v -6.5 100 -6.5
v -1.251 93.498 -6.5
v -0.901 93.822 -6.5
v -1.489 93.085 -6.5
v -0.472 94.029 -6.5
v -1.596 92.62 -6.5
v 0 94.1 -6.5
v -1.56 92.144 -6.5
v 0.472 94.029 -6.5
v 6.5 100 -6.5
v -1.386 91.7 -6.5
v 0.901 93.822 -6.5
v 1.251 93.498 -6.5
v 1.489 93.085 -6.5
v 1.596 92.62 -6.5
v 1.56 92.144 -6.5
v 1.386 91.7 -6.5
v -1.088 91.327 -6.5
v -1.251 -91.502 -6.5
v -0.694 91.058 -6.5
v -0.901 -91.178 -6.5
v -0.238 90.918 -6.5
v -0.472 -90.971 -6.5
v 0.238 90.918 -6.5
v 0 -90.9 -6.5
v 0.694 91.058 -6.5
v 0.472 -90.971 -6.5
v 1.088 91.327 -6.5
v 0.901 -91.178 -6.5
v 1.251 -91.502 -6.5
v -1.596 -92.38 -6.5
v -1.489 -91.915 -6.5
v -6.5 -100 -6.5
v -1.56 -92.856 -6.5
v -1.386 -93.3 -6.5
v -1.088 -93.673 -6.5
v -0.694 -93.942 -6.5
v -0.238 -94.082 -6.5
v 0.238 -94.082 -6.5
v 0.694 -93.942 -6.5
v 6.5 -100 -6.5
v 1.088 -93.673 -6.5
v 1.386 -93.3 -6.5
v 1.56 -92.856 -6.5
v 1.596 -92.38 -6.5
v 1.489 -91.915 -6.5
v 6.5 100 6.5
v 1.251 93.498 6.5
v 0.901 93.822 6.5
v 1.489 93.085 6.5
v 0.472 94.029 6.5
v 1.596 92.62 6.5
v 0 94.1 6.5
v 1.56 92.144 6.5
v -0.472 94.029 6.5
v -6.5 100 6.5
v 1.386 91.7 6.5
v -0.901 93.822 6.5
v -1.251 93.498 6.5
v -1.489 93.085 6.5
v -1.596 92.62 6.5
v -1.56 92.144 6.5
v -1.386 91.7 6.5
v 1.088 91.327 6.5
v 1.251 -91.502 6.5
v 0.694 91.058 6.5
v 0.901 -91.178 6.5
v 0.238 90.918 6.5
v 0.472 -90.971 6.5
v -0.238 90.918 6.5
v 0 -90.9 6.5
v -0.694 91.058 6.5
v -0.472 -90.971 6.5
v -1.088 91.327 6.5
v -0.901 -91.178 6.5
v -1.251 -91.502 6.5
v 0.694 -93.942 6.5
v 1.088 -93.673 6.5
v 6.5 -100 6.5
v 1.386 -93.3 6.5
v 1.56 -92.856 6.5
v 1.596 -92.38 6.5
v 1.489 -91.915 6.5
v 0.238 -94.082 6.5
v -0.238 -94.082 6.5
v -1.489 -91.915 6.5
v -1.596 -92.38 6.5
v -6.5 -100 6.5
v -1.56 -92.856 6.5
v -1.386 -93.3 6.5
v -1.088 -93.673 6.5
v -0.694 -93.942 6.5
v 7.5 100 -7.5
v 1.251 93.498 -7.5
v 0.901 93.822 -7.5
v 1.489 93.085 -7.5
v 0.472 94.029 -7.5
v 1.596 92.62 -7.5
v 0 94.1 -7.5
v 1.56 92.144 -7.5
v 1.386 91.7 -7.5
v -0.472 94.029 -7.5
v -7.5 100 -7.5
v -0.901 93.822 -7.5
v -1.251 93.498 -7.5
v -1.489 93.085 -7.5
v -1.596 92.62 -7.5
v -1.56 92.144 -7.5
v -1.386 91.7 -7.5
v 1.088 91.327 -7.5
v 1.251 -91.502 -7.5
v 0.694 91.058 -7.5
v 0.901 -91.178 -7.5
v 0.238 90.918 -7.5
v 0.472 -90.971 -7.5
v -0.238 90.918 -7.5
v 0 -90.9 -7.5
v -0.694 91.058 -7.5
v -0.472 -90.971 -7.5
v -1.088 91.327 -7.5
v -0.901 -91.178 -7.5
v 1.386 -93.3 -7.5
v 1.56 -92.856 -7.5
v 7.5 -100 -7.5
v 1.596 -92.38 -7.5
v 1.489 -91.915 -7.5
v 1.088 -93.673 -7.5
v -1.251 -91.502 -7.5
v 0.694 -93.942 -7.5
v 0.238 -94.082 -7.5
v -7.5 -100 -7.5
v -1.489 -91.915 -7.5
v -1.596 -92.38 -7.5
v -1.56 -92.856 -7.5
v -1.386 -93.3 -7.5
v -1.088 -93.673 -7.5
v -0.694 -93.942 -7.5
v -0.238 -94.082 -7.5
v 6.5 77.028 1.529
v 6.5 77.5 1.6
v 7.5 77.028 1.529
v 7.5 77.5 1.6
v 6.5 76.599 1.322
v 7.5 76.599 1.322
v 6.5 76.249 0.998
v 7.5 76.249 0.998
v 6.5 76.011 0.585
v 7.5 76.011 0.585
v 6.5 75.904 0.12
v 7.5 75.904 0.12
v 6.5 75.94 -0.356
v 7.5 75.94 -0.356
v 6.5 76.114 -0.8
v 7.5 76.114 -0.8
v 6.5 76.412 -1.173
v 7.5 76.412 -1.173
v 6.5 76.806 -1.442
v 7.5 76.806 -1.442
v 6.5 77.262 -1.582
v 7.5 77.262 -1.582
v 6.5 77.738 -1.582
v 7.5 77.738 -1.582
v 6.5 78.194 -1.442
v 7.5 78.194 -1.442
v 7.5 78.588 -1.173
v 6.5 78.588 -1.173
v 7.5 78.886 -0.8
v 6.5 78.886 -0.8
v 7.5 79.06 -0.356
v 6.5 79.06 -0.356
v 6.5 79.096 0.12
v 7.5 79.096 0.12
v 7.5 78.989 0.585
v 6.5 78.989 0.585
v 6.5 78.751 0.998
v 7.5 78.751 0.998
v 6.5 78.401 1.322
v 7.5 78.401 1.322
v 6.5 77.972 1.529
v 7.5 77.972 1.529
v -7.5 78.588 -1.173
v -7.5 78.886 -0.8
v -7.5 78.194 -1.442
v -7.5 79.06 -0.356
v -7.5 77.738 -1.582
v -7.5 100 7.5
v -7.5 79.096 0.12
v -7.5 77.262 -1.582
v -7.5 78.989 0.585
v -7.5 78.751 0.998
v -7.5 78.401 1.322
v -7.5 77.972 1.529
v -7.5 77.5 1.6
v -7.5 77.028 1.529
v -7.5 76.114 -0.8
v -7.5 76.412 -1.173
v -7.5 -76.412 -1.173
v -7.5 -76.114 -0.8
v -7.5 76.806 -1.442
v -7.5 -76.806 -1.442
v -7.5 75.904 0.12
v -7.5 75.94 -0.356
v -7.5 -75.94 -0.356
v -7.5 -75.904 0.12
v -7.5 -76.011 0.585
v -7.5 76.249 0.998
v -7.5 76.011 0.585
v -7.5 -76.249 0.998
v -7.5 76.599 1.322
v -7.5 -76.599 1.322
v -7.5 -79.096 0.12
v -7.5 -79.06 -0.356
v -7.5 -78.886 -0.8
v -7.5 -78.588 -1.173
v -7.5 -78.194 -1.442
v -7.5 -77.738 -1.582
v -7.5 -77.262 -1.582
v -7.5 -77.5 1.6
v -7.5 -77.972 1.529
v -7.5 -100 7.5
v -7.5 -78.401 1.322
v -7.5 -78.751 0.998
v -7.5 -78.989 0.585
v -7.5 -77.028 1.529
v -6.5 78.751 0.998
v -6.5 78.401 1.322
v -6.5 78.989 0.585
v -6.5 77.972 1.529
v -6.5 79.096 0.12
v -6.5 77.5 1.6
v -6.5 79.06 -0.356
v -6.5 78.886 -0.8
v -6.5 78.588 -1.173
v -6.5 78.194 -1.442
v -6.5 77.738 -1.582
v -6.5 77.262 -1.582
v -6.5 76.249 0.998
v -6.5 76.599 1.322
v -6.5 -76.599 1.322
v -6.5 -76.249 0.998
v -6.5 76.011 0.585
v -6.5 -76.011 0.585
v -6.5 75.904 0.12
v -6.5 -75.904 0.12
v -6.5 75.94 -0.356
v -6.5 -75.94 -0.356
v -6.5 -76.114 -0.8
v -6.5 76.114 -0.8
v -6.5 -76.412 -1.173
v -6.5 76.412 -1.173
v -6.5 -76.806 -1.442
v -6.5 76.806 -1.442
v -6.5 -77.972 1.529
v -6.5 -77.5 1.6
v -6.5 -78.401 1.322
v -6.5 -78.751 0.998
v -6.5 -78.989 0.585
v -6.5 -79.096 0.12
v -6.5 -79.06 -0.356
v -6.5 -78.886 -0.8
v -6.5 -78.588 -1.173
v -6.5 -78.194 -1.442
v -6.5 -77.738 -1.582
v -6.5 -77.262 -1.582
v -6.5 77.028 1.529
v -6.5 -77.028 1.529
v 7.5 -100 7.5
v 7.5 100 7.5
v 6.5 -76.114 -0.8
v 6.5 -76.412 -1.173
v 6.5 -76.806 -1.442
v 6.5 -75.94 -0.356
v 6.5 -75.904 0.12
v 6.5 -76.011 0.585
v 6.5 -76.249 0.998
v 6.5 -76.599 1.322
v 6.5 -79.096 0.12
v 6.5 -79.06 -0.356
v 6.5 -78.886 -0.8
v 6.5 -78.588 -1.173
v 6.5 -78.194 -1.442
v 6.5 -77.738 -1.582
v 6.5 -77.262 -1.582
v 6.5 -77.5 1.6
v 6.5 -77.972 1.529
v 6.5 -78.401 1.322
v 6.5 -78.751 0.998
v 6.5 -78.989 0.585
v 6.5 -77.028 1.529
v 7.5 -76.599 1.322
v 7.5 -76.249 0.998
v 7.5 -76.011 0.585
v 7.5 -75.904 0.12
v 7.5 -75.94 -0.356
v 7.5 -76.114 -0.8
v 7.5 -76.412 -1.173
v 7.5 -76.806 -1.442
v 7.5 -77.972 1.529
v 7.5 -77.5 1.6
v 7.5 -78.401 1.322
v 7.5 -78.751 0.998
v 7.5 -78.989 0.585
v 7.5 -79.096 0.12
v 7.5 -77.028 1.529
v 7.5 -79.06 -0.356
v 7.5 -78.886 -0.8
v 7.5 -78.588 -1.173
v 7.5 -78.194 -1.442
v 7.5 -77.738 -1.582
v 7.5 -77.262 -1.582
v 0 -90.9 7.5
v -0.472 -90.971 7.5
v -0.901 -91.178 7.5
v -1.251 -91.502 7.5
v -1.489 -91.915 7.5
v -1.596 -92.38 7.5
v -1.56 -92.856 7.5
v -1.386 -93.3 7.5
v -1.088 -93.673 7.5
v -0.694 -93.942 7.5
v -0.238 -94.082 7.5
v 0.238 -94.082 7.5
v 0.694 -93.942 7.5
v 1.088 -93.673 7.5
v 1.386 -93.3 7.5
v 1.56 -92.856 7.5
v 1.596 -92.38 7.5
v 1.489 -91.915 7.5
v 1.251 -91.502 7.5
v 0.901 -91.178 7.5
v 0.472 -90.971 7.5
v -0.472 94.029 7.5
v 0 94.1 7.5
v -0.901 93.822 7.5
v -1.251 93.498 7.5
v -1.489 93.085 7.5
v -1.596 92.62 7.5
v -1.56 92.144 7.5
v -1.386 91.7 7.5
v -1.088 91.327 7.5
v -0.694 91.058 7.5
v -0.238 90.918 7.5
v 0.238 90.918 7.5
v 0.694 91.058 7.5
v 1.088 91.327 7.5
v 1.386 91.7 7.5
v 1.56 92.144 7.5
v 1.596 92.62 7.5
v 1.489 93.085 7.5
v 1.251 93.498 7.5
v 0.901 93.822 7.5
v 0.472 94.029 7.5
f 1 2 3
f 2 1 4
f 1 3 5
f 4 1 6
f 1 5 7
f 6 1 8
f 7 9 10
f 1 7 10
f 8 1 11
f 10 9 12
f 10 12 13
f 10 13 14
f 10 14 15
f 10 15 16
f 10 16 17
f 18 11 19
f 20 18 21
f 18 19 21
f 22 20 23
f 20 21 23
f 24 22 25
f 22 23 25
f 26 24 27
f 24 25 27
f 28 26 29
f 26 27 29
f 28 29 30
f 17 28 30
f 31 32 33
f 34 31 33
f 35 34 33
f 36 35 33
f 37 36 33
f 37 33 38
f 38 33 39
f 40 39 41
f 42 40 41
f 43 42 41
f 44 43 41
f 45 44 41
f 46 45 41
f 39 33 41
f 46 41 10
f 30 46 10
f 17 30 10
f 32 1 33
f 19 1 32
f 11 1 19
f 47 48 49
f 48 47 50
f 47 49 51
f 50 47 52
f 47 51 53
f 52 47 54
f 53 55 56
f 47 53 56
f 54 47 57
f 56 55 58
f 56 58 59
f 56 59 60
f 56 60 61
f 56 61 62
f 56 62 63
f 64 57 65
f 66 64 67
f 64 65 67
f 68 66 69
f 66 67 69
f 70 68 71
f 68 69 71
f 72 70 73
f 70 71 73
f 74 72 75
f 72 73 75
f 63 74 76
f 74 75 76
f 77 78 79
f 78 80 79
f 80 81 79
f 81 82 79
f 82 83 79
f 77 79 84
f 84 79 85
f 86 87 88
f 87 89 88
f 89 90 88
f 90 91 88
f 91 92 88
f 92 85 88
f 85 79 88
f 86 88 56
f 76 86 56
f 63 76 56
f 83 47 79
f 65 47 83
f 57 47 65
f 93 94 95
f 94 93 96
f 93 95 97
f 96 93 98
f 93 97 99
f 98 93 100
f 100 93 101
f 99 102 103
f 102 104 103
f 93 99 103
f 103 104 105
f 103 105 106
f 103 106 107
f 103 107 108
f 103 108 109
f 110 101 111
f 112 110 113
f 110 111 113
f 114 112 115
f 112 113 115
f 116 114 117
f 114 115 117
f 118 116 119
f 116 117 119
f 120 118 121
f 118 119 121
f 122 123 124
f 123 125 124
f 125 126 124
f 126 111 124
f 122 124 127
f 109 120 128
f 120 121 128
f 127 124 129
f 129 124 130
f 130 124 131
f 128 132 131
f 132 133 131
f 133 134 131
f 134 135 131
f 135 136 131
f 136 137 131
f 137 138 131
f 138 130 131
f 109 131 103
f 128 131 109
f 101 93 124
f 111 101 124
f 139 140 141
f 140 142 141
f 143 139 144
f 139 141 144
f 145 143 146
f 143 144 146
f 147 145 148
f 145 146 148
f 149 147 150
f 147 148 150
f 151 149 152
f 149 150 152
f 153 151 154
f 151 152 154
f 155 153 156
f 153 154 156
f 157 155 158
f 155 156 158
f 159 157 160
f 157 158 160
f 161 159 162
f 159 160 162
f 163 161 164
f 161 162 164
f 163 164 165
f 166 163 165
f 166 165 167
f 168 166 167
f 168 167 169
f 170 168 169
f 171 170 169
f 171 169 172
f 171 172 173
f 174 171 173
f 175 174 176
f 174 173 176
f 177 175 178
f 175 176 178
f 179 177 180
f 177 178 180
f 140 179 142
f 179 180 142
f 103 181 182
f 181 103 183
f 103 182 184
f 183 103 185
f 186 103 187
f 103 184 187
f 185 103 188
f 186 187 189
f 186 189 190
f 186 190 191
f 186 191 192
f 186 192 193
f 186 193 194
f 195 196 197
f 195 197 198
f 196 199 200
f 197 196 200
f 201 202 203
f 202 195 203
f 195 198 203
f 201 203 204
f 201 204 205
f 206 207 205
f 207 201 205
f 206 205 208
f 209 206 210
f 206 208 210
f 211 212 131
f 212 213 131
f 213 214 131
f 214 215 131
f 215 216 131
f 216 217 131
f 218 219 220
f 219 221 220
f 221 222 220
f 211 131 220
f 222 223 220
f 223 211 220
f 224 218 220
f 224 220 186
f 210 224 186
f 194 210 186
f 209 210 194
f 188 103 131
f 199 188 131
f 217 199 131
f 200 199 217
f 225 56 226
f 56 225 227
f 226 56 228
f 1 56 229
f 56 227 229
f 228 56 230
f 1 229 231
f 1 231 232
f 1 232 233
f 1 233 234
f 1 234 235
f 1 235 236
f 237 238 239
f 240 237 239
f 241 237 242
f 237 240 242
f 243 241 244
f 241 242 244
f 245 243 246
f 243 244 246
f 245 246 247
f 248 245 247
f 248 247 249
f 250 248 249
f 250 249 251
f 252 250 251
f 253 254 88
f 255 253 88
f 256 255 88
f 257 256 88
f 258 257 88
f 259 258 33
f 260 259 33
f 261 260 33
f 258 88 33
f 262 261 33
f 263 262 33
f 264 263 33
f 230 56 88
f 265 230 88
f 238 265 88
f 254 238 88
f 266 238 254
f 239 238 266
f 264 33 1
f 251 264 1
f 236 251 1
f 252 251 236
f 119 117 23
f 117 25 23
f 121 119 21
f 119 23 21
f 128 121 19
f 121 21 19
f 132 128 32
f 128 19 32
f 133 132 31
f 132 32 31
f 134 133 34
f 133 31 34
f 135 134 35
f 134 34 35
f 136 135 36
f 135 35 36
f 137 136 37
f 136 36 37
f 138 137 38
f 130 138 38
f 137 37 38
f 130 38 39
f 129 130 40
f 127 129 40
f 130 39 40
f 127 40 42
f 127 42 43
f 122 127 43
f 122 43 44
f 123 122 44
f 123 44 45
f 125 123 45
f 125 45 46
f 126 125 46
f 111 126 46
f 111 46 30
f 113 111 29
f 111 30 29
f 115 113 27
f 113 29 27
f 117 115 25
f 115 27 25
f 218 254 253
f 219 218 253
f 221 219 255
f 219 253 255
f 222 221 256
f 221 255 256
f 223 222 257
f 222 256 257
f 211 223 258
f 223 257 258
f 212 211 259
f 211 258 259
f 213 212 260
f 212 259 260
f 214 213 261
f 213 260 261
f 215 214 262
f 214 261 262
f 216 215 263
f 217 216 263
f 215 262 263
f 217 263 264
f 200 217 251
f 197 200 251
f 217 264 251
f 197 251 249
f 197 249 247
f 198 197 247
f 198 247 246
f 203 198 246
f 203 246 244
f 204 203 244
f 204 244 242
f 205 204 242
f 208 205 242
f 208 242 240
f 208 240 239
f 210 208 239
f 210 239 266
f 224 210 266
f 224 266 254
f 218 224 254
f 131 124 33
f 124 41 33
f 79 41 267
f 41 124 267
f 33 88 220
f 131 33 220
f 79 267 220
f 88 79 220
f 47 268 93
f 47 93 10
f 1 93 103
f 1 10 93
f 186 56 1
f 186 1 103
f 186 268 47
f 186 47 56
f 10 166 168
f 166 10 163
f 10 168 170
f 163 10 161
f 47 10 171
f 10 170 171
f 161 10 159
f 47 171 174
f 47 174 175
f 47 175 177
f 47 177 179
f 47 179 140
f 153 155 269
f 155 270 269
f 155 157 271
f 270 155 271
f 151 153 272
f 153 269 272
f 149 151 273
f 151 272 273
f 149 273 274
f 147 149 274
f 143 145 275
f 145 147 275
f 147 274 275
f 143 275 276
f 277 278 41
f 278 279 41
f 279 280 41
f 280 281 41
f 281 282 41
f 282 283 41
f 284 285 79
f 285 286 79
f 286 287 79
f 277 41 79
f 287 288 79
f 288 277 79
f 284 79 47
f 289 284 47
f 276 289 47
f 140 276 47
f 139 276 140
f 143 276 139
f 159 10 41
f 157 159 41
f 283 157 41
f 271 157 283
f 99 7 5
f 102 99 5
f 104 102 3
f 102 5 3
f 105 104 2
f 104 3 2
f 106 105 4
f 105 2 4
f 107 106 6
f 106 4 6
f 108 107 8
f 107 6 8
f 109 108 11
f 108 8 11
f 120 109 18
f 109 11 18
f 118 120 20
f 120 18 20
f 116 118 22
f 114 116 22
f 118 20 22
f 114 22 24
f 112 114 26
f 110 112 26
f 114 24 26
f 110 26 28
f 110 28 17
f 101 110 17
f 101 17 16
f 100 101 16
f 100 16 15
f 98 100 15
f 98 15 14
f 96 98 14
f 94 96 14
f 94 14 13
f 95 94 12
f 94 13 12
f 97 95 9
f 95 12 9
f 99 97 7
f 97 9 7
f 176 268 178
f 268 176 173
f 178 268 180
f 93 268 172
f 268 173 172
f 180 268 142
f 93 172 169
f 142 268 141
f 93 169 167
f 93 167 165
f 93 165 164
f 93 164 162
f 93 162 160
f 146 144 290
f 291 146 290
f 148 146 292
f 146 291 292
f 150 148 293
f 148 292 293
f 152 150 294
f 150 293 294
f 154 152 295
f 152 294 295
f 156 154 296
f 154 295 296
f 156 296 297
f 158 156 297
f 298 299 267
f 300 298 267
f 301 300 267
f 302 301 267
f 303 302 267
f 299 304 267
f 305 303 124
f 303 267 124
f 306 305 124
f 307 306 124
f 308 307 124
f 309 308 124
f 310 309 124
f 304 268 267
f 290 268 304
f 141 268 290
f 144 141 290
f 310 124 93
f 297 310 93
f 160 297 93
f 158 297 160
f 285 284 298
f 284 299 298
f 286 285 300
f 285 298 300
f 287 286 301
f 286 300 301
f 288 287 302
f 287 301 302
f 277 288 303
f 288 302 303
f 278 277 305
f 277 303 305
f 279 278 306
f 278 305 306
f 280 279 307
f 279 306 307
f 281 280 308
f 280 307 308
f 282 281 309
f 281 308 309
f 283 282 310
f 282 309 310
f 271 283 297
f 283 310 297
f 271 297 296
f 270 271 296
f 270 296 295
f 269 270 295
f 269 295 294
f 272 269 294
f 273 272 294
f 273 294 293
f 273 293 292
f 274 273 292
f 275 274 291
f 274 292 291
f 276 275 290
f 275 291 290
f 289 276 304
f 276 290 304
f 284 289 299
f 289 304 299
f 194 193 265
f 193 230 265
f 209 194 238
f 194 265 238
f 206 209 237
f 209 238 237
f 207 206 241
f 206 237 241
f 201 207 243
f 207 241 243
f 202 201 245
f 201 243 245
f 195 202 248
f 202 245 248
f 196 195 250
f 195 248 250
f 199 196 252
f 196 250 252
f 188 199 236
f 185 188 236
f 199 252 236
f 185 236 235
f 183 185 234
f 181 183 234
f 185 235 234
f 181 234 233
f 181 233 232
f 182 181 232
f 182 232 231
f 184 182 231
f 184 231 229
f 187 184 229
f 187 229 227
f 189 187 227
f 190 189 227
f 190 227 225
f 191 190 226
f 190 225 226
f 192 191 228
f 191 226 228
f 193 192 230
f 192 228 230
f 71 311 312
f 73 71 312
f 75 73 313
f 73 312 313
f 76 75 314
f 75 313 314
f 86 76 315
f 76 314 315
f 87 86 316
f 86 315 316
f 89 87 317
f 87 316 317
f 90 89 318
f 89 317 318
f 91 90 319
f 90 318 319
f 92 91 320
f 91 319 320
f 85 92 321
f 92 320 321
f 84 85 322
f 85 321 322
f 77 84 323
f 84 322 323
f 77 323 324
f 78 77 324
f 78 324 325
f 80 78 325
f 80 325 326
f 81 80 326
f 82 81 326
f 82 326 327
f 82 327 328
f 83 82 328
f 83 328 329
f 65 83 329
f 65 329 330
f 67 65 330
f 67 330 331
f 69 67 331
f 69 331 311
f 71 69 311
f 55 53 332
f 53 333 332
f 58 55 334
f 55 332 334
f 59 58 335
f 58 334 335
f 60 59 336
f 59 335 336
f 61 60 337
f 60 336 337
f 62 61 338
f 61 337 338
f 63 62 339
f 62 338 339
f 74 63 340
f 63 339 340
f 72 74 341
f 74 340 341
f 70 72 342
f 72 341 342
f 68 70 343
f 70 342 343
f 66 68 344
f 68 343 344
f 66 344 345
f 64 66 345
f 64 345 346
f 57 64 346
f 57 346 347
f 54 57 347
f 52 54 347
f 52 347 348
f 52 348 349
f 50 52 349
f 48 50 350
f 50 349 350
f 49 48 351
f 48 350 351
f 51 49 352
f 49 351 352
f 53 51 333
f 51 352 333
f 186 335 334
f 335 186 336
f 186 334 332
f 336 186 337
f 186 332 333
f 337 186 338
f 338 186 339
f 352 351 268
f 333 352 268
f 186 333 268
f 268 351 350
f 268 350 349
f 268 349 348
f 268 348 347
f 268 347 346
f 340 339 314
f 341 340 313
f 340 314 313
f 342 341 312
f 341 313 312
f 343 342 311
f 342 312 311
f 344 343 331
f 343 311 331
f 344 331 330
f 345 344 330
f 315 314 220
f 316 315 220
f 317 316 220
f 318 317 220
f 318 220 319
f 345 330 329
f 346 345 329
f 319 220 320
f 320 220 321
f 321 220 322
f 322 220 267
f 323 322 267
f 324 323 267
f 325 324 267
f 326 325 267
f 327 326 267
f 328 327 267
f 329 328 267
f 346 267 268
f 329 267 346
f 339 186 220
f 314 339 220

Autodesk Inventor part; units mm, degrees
ref_plane "YZ Plane" through (0, 0, 0) normal (1, 0, 0) x (0, 1, 0)
ref_plane "XZ Plane" through (0, 0, 0) normal (0, 1, 0) x (-1, 0, 0)
ref_plane "XY Plane" through (0, 0, 0) normal (0, 0, 1) x (1, 0, 0)
sketch "スケッチ1" plane through (0, 0, 0) normal (0, 1, 0) x (-1, 0, 0)
  line L0 (-7.5, -7.5) -> (7.5, -7.5)
  line L1 (7.5, -7.5) -> (7.5, 7.5)
  line L2 (7.5, 7.5) -> (-7.5, 7.5)
  line L3 (-7.5, 7.5) -> (-7.5, -7.5)
  line L4 (-7.5, -7.5) -> (7.5, 7.5) construction
  line L5 (7.5, -7.5) -> (-7.5, 7.5) construction
  line L6 (6.5, 6.5) -> (6.5, -6.5)
  line L7 (6.5, -6.5) -> (-6.5, -6.5)
  line L8 (-6.5, -6.5) -> (-6.5, 6.5)
  line L9 (-6.5, 6.5) -> (6.5, 6.5)
  point P0 (0, 0)
  dimension "d0" = 15
  dimension "d1" = 15
extrude "押し出し1" add sketch "スケッチ1" along normal mid plane 200
sketch "スケッチ3" plane through (-7.5, -100, 7.5) normal (-1, 0, 0) x (0, 0, 1)
  line L0 (-7.5, 177.5) -> (-7.5, 22.5)
  line L1 (0, 0) -> (-15, 0) projected
  point P0 (-7.5, 100)
  point P1 (-7.5, 100)
  dimension "d20" = 22.5
hole "穴1" at (-7.5, 77.5, 0) at (-7.5, -77.5, 0) direction (1, 0, 0) diameter 3.2 end through all
sketch "スケッチ4" plane through (7.5, 100, -7.5) normal (0, 0, -1) x (-1, 0, 0)
  line L0 (7.5, -7.5) -> (7.5, -192.5)
  line L1 (15, -200) -> (0, -200) projected
  point P0 (7.5, -100)
  point P1 (7.5, -100)
  dimension "d21" = 7.5
hole "穴2" at (0, 92.5, -7.5) at (0, -92.5, -7.5) direction (0, 0, 1) diameter 3.2 end through all
properties part number "回路角柱L200"
